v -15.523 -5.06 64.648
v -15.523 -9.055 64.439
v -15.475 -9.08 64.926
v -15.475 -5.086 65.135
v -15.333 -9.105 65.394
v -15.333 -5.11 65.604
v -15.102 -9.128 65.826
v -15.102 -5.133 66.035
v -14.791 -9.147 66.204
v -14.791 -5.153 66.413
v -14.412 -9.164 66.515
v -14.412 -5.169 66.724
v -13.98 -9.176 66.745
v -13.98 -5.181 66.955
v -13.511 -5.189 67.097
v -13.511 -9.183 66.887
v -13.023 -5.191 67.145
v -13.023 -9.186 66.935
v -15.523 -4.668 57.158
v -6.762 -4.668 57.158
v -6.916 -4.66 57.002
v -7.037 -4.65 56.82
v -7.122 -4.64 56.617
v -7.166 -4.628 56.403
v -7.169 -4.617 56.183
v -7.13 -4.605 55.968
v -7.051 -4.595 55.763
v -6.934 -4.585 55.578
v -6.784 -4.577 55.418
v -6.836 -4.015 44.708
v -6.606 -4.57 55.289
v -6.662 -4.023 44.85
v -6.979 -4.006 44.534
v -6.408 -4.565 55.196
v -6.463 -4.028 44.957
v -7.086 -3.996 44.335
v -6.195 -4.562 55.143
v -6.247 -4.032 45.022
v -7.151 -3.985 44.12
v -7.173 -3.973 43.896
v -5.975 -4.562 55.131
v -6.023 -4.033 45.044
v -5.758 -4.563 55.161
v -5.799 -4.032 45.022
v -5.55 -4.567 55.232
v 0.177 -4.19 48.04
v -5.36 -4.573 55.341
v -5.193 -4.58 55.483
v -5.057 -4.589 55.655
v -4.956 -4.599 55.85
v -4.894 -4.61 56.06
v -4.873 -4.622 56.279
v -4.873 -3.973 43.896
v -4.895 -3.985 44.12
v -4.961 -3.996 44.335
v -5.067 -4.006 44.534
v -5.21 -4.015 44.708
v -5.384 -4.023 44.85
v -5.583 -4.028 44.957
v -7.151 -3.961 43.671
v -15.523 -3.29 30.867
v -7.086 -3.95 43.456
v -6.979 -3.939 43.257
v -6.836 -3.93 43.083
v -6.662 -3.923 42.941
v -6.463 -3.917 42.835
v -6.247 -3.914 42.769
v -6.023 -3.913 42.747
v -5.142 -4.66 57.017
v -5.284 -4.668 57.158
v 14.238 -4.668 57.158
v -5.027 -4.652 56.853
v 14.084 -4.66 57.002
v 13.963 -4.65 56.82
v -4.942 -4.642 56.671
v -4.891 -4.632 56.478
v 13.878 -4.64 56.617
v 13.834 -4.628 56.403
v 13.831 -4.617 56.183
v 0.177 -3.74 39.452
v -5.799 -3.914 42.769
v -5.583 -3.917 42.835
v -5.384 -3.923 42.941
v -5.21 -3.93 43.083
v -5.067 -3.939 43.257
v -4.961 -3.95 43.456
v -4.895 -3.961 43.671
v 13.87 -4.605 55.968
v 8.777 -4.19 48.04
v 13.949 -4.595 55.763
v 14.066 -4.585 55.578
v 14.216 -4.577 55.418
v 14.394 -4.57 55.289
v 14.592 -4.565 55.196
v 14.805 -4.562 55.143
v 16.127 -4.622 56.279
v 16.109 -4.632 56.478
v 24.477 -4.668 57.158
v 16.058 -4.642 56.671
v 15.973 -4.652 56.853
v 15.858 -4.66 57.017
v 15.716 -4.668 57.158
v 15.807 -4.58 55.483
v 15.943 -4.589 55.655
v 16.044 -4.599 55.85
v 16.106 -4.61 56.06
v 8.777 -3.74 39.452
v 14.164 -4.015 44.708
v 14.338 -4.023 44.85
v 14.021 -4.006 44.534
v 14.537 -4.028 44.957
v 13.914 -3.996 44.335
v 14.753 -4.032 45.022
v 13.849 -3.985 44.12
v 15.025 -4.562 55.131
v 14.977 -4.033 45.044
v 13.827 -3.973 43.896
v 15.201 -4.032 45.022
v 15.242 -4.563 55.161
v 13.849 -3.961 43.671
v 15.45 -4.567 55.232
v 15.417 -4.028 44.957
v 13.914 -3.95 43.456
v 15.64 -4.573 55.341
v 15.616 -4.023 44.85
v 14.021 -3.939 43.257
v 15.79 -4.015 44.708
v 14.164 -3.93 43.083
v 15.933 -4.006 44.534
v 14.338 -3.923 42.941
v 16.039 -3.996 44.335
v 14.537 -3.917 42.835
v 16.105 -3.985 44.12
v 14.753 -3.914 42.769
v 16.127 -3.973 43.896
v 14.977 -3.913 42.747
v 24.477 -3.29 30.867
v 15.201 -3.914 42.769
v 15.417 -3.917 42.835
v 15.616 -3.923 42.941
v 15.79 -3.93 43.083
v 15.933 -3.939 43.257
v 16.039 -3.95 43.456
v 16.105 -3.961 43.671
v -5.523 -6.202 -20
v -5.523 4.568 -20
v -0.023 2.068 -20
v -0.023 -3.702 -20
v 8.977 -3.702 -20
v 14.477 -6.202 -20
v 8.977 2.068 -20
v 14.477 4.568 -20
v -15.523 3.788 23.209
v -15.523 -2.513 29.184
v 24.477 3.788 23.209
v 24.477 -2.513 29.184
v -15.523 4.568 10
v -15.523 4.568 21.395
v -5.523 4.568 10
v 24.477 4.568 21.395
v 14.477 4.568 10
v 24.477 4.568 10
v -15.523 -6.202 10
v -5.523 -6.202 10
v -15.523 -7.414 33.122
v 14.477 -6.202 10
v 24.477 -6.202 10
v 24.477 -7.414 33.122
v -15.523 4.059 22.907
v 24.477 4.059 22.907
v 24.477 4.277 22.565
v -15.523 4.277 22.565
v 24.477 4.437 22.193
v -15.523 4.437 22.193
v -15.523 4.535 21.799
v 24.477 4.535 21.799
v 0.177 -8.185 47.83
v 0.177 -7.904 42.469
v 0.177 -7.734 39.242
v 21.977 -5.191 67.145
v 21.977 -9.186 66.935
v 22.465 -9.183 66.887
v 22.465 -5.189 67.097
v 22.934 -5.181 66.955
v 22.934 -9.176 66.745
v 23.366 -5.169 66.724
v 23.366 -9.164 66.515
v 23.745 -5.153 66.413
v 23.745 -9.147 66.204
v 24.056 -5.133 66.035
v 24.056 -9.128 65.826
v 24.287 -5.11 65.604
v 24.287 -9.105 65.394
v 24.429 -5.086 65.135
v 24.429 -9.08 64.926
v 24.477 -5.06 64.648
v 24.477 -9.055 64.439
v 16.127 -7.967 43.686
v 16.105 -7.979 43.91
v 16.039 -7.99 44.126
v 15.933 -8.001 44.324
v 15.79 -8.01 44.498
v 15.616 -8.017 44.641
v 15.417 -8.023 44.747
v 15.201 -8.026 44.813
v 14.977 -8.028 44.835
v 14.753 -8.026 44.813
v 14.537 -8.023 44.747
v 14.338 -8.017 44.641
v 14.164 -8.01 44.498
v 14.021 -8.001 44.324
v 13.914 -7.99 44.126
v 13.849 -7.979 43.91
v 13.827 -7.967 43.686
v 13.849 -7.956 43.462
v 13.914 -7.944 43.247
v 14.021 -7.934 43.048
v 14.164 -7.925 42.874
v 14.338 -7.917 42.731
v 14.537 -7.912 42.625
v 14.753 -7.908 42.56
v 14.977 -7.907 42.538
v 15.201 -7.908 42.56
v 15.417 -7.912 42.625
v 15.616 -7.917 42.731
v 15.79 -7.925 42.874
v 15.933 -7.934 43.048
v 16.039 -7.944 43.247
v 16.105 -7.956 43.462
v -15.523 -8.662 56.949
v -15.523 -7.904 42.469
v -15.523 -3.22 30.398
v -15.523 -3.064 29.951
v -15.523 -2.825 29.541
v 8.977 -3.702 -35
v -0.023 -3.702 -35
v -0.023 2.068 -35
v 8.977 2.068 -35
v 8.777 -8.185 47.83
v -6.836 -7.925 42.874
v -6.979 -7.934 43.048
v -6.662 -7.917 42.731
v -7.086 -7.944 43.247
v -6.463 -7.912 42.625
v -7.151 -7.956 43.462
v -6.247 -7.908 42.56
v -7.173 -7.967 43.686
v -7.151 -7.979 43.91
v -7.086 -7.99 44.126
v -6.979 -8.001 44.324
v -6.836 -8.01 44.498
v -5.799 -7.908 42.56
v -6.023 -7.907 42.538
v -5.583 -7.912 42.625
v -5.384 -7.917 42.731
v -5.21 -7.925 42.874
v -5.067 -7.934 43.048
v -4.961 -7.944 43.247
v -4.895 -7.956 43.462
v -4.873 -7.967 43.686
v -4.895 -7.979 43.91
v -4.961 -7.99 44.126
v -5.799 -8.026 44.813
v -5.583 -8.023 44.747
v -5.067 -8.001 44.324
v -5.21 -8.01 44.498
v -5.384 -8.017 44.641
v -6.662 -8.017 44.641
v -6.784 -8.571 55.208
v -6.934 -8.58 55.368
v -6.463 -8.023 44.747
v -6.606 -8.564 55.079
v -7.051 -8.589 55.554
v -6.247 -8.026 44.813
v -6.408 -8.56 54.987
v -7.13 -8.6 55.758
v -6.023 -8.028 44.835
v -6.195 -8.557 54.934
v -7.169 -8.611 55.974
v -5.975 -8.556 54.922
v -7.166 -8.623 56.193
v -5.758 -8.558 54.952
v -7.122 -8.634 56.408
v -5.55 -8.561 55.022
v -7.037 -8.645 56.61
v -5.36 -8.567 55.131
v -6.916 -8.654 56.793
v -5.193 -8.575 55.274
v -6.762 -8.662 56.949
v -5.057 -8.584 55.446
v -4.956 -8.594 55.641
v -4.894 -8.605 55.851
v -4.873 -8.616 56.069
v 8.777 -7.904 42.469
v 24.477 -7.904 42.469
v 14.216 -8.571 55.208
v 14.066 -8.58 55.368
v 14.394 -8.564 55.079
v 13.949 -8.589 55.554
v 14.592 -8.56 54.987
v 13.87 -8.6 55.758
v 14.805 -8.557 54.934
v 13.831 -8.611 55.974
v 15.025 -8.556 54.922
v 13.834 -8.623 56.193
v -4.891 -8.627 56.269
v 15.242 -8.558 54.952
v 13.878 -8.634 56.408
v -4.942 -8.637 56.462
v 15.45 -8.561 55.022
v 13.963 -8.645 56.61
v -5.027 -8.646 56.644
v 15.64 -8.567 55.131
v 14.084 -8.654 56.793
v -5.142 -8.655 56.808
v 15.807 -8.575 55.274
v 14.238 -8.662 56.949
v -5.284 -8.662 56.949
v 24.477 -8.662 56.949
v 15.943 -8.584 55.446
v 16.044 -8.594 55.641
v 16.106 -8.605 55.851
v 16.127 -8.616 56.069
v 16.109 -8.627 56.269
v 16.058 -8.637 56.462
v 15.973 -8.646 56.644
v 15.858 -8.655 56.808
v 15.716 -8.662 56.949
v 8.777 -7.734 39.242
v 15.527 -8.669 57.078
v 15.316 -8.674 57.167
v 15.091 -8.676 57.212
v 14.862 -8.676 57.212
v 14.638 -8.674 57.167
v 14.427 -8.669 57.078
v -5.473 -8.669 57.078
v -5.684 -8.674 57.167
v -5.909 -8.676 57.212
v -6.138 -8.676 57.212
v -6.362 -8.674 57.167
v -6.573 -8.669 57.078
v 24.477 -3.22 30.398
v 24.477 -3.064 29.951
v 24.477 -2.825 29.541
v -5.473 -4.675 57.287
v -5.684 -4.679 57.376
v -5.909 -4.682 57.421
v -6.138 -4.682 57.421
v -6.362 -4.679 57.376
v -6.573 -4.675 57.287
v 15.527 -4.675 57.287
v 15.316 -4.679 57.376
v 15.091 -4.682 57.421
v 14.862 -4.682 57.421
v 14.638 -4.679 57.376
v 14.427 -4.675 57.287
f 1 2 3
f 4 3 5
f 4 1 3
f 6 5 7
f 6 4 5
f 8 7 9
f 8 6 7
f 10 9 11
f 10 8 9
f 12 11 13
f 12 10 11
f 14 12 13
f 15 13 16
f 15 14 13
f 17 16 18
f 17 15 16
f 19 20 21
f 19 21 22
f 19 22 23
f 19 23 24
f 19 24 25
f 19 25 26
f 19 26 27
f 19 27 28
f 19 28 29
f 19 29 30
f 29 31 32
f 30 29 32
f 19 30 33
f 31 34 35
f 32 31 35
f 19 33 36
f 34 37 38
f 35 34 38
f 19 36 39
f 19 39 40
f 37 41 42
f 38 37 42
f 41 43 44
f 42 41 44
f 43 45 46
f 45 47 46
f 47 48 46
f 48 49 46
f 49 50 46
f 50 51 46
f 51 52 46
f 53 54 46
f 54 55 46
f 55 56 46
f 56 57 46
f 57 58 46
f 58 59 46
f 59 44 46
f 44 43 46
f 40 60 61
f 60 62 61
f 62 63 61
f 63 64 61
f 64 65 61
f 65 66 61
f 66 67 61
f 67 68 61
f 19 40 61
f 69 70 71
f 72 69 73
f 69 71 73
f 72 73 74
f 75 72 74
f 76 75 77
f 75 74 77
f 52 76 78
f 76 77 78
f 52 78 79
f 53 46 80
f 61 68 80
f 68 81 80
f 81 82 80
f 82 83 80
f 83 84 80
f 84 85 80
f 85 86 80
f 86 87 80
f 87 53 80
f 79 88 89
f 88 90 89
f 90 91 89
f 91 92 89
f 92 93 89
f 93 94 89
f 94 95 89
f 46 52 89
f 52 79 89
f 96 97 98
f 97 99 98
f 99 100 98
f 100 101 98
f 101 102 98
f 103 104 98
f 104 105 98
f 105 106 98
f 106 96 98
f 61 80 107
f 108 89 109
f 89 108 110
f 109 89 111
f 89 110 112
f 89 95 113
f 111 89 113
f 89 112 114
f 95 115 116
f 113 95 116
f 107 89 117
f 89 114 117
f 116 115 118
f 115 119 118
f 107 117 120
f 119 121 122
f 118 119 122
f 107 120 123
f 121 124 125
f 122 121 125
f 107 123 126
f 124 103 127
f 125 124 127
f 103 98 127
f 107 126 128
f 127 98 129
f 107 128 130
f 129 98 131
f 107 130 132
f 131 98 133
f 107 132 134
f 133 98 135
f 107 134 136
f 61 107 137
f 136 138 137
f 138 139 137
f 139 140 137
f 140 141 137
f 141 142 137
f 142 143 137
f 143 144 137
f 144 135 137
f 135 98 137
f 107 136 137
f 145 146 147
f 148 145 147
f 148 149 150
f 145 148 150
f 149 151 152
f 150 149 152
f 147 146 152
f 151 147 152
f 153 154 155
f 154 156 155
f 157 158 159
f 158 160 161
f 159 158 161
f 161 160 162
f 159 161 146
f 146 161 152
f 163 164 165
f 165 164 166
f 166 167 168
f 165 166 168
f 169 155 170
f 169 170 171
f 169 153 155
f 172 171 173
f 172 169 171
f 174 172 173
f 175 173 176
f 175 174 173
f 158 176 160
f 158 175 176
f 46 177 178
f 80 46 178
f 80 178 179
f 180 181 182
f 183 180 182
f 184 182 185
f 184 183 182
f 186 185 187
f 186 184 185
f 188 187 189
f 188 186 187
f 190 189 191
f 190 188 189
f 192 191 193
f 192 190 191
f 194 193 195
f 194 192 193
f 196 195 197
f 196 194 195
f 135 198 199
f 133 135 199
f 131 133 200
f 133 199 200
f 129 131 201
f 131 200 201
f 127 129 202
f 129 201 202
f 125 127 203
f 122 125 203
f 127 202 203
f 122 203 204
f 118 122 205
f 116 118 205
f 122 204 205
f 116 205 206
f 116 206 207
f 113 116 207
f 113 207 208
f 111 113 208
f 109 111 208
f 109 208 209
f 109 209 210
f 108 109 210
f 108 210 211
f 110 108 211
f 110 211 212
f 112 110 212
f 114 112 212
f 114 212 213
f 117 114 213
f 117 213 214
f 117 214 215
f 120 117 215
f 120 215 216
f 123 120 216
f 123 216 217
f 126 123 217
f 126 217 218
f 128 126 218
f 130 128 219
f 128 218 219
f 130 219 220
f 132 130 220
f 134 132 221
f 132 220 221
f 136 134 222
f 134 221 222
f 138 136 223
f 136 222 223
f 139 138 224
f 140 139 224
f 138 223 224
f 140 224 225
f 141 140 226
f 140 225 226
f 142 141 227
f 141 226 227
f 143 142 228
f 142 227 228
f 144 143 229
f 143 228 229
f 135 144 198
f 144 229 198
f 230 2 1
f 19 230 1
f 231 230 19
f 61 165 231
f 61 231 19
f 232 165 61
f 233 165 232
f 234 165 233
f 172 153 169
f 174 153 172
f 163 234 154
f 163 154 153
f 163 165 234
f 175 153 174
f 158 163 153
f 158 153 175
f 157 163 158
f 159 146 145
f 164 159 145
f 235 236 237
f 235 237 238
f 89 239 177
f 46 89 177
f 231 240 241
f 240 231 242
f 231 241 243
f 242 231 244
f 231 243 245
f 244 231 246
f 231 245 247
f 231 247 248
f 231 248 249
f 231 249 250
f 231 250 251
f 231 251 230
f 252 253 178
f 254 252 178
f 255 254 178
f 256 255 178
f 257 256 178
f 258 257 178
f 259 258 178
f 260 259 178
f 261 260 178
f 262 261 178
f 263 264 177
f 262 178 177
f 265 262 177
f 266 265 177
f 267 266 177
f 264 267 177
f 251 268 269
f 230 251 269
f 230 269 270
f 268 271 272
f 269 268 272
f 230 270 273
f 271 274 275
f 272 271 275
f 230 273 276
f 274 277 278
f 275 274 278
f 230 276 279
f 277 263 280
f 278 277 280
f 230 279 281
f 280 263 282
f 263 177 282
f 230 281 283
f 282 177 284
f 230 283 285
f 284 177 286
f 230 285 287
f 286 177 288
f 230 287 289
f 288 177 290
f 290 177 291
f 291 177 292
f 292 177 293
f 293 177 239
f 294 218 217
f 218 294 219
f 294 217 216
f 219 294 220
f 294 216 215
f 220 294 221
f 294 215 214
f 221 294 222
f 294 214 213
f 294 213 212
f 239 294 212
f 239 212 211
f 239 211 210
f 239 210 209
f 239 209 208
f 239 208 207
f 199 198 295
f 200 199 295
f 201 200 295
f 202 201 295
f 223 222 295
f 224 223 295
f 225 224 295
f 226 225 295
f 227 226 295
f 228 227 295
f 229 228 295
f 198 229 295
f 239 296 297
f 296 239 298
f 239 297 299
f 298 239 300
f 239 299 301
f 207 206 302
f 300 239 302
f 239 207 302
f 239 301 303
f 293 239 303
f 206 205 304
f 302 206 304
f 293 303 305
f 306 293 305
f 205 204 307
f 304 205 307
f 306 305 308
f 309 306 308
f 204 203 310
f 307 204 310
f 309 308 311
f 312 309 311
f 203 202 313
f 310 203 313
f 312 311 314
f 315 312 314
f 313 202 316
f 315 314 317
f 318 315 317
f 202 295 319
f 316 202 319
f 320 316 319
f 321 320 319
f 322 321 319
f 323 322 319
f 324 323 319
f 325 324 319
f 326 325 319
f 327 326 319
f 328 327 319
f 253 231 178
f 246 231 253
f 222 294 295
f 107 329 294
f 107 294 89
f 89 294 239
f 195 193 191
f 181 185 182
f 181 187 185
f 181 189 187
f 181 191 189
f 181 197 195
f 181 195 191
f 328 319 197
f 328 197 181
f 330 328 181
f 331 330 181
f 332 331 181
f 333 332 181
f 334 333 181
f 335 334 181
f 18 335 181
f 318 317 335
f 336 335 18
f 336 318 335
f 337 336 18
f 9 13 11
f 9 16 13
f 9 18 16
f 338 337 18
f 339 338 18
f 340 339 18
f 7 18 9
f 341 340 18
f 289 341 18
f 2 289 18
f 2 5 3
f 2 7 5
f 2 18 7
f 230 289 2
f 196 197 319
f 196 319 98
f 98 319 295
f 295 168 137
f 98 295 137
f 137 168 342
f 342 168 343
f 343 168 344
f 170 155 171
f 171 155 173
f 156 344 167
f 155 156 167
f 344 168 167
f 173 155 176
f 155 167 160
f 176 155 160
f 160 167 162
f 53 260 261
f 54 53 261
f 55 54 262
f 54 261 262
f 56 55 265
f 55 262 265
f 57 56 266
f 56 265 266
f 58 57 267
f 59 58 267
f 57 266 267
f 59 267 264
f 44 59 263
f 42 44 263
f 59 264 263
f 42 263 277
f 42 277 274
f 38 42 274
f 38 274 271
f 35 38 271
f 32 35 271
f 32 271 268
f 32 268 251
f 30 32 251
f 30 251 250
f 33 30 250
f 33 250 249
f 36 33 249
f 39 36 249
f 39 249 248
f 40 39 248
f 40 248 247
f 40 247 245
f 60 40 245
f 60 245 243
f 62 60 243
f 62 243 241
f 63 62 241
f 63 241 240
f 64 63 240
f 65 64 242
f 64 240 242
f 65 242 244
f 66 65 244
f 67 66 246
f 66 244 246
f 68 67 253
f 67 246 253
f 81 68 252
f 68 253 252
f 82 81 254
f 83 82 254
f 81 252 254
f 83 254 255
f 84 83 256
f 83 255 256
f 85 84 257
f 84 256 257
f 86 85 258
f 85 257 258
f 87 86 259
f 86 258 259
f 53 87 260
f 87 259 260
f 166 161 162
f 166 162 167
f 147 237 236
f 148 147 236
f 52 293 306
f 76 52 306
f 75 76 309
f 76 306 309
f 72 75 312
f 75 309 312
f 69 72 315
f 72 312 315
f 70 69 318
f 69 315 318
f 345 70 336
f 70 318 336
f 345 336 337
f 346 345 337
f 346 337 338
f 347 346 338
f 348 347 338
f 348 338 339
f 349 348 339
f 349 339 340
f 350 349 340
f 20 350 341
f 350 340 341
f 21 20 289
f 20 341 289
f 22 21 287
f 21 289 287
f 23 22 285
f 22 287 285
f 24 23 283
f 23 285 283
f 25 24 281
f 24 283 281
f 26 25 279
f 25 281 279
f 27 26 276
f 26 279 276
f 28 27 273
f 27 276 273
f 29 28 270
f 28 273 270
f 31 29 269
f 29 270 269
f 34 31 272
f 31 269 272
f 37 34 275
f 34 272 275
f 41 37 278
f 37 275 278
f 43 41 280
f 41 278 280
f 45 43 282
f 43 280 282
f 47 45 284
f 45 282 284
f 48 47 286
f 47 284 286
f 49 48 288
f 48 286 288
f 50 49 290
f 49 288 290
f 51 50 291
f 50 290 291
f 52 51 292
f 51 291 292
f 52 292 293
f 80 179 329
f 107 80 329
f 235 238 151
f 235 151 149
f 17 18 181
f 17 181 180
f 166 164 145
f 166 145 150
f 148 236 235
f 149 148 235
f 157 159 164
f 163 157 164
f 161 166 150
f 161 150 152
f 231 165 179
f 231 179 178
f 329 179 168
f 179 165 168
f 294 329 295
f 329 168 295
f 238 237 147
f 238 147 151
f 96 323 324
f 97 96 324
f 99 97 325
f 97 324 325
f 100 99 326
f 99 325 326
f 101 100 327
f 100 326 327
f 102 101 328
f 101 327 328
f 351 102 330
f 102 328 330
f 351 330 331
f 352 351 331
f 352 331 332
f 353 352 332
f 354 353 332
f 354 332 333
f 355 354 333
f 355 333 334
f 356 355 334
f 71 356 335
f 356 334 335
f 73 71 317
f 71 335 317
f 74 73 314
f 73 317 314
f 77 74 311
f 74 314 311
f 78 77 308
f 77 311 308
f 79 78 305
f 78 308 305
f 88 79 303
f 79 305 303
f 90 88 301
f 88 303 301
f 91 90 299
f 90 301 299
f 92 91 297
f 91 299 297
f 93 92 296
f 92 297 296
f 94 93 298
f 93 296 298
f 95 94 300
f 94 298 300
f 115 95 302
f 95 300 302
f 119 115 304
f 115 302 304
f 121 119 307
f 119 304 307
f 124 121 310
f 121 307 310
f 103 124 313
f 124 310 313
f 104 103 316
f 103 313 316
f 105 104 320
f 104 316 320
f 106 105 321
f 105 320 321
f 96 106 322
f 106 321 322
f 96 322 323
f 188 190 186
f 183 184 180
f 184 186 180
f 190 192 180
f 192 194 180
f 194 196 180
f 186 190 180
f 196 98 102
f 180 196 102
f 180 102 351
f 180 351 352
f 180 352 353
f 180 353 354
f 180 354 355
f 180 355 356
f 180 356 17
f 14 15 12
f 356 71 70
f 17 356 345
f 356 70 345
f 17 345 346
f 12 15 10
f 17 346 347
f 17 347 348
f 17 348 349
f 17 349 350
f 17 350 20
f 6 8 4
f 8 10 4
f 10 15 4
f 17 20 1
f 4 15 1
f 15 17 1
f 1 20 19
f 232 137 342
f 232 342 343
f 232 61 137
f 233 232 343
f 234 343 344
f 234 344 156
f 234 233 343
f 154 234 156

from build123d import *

# Parameters (mm, degrees)
F0_W          = 20
F0_H          = 10.77
F1_DEPTH      = 10
F1_DEPTH_BACK = 20
F3_DEPTH      = 30
F3_DEPTH_BACK = 10
F4_DEPTH      = 10
F5_R          = 1.15
F6_DEPTH      = 25
F7_W          = 9
F7_H          = 5.77
F8_DEPTH      = 15
F9_R          = 2.5
F10_R         = 2.5


with BuildPart() as f1:
    # F0 (on Top) → F1 (new body, two sides)
    with BuildSketch(Plane.XY) as f1_sk:
        with Locations((4.4768884756, -0.816908665)):
            Rectangle(F0_W, F0_H)
    extrude(amount=F1_DEPTH)
    extrude(f1_sk.sketch, amount=-F1_DEPTH_BACK)

    # F2 (on face) → F3 (join, two sides)
    with BuildSketch(Plane(origin=(-5.5231115244, 0, 0), x_dir=(0, -1, 0), z_dir=(-1, 0, 0))) as f3_sk:
        Polygon((7.9035344876, 42.4689549124), (8.6624058531, 56.9490831664), (4.6678877141, 57.1584269913), (3.2377782985, 29.8703137532), (-4.568091335, 22.4698111415), (-4.568091335, 10), (6.201908665, 10), (7.4136699372, 33.1217824671), align=None)
    extrude(amount=-F3_DEPTH)
    extrude(f3_sk.sketch, amount=F3_DEPTH_BACK)

    # F4 (add): a face of the model
    f4_faces = [f1.faces().sort_by_distance(p)[0] for p in [
        (4.4768884756, -6.6651467836, 57.0537550789),
    ]]
    extrude(f4_faces, amount=F4_DEPTH)

    # F5 (on face) → F6 (cut)
    with BuildSketch(Plane(origin=(0, -5.6622789964, -0.2967474679), x_dir=(1, 0, 0), z_dir=(0, -0.9986295348, -0.0523359562))):
        Polygon((8.7768884756, 48.1932846266), (4.4768884756, 48.1932846266), (0.1768884756, 48.1932846266), (0.1768884756, 39.5932846266), (8.7768884756, 39.5932846266), align=None)
        with Locations((14.9768884756, 56.4432846266)):
            Circle(F5_R)
        with Locations((14.9768884756, 44.0432846266)):
            Circle(F5_R)
        with Locations((-6.0231115244, 44.0432846266)):
            Circle(F5_R)
        with Locations((-6.0231115244, 56.4432846266)):
            Circle(F5_R)
    extrude(amount=-F6_DEPTH, mode=Mode.SUBTRACT)

    # F7 (on face) → F8 (join)
    with BuildSketch(Plane(origin=(0, 0, -20), x_dir=(1, 0, 0), z_dir=(0, 0, -1))):
        with Locations((4.4768884756, 0.816908665)):
            Rectangle(F7_W, F7_H)
    extrude(amount=F8_DEPTH)

    # F9
    f9_edges = [f1.edges().sort_by_distance(p)[0] for p in [
        (-15.523112, -7.188506, 67.04005),
        (24.476888, -7.188506, 67.04005),
    ]]
    fillet(f9_edges, radius=F9_R)

    # F10
    f10_edges = [f1.edges().sort_by_distance(p)[0] for p in [
        (4.476888, -3.237778, 29.870314),
        (4.476888, 4.568091, 22.469811),
    ]]
    fillet(f10_edges, radius=F10_R)


solid = f1.part
